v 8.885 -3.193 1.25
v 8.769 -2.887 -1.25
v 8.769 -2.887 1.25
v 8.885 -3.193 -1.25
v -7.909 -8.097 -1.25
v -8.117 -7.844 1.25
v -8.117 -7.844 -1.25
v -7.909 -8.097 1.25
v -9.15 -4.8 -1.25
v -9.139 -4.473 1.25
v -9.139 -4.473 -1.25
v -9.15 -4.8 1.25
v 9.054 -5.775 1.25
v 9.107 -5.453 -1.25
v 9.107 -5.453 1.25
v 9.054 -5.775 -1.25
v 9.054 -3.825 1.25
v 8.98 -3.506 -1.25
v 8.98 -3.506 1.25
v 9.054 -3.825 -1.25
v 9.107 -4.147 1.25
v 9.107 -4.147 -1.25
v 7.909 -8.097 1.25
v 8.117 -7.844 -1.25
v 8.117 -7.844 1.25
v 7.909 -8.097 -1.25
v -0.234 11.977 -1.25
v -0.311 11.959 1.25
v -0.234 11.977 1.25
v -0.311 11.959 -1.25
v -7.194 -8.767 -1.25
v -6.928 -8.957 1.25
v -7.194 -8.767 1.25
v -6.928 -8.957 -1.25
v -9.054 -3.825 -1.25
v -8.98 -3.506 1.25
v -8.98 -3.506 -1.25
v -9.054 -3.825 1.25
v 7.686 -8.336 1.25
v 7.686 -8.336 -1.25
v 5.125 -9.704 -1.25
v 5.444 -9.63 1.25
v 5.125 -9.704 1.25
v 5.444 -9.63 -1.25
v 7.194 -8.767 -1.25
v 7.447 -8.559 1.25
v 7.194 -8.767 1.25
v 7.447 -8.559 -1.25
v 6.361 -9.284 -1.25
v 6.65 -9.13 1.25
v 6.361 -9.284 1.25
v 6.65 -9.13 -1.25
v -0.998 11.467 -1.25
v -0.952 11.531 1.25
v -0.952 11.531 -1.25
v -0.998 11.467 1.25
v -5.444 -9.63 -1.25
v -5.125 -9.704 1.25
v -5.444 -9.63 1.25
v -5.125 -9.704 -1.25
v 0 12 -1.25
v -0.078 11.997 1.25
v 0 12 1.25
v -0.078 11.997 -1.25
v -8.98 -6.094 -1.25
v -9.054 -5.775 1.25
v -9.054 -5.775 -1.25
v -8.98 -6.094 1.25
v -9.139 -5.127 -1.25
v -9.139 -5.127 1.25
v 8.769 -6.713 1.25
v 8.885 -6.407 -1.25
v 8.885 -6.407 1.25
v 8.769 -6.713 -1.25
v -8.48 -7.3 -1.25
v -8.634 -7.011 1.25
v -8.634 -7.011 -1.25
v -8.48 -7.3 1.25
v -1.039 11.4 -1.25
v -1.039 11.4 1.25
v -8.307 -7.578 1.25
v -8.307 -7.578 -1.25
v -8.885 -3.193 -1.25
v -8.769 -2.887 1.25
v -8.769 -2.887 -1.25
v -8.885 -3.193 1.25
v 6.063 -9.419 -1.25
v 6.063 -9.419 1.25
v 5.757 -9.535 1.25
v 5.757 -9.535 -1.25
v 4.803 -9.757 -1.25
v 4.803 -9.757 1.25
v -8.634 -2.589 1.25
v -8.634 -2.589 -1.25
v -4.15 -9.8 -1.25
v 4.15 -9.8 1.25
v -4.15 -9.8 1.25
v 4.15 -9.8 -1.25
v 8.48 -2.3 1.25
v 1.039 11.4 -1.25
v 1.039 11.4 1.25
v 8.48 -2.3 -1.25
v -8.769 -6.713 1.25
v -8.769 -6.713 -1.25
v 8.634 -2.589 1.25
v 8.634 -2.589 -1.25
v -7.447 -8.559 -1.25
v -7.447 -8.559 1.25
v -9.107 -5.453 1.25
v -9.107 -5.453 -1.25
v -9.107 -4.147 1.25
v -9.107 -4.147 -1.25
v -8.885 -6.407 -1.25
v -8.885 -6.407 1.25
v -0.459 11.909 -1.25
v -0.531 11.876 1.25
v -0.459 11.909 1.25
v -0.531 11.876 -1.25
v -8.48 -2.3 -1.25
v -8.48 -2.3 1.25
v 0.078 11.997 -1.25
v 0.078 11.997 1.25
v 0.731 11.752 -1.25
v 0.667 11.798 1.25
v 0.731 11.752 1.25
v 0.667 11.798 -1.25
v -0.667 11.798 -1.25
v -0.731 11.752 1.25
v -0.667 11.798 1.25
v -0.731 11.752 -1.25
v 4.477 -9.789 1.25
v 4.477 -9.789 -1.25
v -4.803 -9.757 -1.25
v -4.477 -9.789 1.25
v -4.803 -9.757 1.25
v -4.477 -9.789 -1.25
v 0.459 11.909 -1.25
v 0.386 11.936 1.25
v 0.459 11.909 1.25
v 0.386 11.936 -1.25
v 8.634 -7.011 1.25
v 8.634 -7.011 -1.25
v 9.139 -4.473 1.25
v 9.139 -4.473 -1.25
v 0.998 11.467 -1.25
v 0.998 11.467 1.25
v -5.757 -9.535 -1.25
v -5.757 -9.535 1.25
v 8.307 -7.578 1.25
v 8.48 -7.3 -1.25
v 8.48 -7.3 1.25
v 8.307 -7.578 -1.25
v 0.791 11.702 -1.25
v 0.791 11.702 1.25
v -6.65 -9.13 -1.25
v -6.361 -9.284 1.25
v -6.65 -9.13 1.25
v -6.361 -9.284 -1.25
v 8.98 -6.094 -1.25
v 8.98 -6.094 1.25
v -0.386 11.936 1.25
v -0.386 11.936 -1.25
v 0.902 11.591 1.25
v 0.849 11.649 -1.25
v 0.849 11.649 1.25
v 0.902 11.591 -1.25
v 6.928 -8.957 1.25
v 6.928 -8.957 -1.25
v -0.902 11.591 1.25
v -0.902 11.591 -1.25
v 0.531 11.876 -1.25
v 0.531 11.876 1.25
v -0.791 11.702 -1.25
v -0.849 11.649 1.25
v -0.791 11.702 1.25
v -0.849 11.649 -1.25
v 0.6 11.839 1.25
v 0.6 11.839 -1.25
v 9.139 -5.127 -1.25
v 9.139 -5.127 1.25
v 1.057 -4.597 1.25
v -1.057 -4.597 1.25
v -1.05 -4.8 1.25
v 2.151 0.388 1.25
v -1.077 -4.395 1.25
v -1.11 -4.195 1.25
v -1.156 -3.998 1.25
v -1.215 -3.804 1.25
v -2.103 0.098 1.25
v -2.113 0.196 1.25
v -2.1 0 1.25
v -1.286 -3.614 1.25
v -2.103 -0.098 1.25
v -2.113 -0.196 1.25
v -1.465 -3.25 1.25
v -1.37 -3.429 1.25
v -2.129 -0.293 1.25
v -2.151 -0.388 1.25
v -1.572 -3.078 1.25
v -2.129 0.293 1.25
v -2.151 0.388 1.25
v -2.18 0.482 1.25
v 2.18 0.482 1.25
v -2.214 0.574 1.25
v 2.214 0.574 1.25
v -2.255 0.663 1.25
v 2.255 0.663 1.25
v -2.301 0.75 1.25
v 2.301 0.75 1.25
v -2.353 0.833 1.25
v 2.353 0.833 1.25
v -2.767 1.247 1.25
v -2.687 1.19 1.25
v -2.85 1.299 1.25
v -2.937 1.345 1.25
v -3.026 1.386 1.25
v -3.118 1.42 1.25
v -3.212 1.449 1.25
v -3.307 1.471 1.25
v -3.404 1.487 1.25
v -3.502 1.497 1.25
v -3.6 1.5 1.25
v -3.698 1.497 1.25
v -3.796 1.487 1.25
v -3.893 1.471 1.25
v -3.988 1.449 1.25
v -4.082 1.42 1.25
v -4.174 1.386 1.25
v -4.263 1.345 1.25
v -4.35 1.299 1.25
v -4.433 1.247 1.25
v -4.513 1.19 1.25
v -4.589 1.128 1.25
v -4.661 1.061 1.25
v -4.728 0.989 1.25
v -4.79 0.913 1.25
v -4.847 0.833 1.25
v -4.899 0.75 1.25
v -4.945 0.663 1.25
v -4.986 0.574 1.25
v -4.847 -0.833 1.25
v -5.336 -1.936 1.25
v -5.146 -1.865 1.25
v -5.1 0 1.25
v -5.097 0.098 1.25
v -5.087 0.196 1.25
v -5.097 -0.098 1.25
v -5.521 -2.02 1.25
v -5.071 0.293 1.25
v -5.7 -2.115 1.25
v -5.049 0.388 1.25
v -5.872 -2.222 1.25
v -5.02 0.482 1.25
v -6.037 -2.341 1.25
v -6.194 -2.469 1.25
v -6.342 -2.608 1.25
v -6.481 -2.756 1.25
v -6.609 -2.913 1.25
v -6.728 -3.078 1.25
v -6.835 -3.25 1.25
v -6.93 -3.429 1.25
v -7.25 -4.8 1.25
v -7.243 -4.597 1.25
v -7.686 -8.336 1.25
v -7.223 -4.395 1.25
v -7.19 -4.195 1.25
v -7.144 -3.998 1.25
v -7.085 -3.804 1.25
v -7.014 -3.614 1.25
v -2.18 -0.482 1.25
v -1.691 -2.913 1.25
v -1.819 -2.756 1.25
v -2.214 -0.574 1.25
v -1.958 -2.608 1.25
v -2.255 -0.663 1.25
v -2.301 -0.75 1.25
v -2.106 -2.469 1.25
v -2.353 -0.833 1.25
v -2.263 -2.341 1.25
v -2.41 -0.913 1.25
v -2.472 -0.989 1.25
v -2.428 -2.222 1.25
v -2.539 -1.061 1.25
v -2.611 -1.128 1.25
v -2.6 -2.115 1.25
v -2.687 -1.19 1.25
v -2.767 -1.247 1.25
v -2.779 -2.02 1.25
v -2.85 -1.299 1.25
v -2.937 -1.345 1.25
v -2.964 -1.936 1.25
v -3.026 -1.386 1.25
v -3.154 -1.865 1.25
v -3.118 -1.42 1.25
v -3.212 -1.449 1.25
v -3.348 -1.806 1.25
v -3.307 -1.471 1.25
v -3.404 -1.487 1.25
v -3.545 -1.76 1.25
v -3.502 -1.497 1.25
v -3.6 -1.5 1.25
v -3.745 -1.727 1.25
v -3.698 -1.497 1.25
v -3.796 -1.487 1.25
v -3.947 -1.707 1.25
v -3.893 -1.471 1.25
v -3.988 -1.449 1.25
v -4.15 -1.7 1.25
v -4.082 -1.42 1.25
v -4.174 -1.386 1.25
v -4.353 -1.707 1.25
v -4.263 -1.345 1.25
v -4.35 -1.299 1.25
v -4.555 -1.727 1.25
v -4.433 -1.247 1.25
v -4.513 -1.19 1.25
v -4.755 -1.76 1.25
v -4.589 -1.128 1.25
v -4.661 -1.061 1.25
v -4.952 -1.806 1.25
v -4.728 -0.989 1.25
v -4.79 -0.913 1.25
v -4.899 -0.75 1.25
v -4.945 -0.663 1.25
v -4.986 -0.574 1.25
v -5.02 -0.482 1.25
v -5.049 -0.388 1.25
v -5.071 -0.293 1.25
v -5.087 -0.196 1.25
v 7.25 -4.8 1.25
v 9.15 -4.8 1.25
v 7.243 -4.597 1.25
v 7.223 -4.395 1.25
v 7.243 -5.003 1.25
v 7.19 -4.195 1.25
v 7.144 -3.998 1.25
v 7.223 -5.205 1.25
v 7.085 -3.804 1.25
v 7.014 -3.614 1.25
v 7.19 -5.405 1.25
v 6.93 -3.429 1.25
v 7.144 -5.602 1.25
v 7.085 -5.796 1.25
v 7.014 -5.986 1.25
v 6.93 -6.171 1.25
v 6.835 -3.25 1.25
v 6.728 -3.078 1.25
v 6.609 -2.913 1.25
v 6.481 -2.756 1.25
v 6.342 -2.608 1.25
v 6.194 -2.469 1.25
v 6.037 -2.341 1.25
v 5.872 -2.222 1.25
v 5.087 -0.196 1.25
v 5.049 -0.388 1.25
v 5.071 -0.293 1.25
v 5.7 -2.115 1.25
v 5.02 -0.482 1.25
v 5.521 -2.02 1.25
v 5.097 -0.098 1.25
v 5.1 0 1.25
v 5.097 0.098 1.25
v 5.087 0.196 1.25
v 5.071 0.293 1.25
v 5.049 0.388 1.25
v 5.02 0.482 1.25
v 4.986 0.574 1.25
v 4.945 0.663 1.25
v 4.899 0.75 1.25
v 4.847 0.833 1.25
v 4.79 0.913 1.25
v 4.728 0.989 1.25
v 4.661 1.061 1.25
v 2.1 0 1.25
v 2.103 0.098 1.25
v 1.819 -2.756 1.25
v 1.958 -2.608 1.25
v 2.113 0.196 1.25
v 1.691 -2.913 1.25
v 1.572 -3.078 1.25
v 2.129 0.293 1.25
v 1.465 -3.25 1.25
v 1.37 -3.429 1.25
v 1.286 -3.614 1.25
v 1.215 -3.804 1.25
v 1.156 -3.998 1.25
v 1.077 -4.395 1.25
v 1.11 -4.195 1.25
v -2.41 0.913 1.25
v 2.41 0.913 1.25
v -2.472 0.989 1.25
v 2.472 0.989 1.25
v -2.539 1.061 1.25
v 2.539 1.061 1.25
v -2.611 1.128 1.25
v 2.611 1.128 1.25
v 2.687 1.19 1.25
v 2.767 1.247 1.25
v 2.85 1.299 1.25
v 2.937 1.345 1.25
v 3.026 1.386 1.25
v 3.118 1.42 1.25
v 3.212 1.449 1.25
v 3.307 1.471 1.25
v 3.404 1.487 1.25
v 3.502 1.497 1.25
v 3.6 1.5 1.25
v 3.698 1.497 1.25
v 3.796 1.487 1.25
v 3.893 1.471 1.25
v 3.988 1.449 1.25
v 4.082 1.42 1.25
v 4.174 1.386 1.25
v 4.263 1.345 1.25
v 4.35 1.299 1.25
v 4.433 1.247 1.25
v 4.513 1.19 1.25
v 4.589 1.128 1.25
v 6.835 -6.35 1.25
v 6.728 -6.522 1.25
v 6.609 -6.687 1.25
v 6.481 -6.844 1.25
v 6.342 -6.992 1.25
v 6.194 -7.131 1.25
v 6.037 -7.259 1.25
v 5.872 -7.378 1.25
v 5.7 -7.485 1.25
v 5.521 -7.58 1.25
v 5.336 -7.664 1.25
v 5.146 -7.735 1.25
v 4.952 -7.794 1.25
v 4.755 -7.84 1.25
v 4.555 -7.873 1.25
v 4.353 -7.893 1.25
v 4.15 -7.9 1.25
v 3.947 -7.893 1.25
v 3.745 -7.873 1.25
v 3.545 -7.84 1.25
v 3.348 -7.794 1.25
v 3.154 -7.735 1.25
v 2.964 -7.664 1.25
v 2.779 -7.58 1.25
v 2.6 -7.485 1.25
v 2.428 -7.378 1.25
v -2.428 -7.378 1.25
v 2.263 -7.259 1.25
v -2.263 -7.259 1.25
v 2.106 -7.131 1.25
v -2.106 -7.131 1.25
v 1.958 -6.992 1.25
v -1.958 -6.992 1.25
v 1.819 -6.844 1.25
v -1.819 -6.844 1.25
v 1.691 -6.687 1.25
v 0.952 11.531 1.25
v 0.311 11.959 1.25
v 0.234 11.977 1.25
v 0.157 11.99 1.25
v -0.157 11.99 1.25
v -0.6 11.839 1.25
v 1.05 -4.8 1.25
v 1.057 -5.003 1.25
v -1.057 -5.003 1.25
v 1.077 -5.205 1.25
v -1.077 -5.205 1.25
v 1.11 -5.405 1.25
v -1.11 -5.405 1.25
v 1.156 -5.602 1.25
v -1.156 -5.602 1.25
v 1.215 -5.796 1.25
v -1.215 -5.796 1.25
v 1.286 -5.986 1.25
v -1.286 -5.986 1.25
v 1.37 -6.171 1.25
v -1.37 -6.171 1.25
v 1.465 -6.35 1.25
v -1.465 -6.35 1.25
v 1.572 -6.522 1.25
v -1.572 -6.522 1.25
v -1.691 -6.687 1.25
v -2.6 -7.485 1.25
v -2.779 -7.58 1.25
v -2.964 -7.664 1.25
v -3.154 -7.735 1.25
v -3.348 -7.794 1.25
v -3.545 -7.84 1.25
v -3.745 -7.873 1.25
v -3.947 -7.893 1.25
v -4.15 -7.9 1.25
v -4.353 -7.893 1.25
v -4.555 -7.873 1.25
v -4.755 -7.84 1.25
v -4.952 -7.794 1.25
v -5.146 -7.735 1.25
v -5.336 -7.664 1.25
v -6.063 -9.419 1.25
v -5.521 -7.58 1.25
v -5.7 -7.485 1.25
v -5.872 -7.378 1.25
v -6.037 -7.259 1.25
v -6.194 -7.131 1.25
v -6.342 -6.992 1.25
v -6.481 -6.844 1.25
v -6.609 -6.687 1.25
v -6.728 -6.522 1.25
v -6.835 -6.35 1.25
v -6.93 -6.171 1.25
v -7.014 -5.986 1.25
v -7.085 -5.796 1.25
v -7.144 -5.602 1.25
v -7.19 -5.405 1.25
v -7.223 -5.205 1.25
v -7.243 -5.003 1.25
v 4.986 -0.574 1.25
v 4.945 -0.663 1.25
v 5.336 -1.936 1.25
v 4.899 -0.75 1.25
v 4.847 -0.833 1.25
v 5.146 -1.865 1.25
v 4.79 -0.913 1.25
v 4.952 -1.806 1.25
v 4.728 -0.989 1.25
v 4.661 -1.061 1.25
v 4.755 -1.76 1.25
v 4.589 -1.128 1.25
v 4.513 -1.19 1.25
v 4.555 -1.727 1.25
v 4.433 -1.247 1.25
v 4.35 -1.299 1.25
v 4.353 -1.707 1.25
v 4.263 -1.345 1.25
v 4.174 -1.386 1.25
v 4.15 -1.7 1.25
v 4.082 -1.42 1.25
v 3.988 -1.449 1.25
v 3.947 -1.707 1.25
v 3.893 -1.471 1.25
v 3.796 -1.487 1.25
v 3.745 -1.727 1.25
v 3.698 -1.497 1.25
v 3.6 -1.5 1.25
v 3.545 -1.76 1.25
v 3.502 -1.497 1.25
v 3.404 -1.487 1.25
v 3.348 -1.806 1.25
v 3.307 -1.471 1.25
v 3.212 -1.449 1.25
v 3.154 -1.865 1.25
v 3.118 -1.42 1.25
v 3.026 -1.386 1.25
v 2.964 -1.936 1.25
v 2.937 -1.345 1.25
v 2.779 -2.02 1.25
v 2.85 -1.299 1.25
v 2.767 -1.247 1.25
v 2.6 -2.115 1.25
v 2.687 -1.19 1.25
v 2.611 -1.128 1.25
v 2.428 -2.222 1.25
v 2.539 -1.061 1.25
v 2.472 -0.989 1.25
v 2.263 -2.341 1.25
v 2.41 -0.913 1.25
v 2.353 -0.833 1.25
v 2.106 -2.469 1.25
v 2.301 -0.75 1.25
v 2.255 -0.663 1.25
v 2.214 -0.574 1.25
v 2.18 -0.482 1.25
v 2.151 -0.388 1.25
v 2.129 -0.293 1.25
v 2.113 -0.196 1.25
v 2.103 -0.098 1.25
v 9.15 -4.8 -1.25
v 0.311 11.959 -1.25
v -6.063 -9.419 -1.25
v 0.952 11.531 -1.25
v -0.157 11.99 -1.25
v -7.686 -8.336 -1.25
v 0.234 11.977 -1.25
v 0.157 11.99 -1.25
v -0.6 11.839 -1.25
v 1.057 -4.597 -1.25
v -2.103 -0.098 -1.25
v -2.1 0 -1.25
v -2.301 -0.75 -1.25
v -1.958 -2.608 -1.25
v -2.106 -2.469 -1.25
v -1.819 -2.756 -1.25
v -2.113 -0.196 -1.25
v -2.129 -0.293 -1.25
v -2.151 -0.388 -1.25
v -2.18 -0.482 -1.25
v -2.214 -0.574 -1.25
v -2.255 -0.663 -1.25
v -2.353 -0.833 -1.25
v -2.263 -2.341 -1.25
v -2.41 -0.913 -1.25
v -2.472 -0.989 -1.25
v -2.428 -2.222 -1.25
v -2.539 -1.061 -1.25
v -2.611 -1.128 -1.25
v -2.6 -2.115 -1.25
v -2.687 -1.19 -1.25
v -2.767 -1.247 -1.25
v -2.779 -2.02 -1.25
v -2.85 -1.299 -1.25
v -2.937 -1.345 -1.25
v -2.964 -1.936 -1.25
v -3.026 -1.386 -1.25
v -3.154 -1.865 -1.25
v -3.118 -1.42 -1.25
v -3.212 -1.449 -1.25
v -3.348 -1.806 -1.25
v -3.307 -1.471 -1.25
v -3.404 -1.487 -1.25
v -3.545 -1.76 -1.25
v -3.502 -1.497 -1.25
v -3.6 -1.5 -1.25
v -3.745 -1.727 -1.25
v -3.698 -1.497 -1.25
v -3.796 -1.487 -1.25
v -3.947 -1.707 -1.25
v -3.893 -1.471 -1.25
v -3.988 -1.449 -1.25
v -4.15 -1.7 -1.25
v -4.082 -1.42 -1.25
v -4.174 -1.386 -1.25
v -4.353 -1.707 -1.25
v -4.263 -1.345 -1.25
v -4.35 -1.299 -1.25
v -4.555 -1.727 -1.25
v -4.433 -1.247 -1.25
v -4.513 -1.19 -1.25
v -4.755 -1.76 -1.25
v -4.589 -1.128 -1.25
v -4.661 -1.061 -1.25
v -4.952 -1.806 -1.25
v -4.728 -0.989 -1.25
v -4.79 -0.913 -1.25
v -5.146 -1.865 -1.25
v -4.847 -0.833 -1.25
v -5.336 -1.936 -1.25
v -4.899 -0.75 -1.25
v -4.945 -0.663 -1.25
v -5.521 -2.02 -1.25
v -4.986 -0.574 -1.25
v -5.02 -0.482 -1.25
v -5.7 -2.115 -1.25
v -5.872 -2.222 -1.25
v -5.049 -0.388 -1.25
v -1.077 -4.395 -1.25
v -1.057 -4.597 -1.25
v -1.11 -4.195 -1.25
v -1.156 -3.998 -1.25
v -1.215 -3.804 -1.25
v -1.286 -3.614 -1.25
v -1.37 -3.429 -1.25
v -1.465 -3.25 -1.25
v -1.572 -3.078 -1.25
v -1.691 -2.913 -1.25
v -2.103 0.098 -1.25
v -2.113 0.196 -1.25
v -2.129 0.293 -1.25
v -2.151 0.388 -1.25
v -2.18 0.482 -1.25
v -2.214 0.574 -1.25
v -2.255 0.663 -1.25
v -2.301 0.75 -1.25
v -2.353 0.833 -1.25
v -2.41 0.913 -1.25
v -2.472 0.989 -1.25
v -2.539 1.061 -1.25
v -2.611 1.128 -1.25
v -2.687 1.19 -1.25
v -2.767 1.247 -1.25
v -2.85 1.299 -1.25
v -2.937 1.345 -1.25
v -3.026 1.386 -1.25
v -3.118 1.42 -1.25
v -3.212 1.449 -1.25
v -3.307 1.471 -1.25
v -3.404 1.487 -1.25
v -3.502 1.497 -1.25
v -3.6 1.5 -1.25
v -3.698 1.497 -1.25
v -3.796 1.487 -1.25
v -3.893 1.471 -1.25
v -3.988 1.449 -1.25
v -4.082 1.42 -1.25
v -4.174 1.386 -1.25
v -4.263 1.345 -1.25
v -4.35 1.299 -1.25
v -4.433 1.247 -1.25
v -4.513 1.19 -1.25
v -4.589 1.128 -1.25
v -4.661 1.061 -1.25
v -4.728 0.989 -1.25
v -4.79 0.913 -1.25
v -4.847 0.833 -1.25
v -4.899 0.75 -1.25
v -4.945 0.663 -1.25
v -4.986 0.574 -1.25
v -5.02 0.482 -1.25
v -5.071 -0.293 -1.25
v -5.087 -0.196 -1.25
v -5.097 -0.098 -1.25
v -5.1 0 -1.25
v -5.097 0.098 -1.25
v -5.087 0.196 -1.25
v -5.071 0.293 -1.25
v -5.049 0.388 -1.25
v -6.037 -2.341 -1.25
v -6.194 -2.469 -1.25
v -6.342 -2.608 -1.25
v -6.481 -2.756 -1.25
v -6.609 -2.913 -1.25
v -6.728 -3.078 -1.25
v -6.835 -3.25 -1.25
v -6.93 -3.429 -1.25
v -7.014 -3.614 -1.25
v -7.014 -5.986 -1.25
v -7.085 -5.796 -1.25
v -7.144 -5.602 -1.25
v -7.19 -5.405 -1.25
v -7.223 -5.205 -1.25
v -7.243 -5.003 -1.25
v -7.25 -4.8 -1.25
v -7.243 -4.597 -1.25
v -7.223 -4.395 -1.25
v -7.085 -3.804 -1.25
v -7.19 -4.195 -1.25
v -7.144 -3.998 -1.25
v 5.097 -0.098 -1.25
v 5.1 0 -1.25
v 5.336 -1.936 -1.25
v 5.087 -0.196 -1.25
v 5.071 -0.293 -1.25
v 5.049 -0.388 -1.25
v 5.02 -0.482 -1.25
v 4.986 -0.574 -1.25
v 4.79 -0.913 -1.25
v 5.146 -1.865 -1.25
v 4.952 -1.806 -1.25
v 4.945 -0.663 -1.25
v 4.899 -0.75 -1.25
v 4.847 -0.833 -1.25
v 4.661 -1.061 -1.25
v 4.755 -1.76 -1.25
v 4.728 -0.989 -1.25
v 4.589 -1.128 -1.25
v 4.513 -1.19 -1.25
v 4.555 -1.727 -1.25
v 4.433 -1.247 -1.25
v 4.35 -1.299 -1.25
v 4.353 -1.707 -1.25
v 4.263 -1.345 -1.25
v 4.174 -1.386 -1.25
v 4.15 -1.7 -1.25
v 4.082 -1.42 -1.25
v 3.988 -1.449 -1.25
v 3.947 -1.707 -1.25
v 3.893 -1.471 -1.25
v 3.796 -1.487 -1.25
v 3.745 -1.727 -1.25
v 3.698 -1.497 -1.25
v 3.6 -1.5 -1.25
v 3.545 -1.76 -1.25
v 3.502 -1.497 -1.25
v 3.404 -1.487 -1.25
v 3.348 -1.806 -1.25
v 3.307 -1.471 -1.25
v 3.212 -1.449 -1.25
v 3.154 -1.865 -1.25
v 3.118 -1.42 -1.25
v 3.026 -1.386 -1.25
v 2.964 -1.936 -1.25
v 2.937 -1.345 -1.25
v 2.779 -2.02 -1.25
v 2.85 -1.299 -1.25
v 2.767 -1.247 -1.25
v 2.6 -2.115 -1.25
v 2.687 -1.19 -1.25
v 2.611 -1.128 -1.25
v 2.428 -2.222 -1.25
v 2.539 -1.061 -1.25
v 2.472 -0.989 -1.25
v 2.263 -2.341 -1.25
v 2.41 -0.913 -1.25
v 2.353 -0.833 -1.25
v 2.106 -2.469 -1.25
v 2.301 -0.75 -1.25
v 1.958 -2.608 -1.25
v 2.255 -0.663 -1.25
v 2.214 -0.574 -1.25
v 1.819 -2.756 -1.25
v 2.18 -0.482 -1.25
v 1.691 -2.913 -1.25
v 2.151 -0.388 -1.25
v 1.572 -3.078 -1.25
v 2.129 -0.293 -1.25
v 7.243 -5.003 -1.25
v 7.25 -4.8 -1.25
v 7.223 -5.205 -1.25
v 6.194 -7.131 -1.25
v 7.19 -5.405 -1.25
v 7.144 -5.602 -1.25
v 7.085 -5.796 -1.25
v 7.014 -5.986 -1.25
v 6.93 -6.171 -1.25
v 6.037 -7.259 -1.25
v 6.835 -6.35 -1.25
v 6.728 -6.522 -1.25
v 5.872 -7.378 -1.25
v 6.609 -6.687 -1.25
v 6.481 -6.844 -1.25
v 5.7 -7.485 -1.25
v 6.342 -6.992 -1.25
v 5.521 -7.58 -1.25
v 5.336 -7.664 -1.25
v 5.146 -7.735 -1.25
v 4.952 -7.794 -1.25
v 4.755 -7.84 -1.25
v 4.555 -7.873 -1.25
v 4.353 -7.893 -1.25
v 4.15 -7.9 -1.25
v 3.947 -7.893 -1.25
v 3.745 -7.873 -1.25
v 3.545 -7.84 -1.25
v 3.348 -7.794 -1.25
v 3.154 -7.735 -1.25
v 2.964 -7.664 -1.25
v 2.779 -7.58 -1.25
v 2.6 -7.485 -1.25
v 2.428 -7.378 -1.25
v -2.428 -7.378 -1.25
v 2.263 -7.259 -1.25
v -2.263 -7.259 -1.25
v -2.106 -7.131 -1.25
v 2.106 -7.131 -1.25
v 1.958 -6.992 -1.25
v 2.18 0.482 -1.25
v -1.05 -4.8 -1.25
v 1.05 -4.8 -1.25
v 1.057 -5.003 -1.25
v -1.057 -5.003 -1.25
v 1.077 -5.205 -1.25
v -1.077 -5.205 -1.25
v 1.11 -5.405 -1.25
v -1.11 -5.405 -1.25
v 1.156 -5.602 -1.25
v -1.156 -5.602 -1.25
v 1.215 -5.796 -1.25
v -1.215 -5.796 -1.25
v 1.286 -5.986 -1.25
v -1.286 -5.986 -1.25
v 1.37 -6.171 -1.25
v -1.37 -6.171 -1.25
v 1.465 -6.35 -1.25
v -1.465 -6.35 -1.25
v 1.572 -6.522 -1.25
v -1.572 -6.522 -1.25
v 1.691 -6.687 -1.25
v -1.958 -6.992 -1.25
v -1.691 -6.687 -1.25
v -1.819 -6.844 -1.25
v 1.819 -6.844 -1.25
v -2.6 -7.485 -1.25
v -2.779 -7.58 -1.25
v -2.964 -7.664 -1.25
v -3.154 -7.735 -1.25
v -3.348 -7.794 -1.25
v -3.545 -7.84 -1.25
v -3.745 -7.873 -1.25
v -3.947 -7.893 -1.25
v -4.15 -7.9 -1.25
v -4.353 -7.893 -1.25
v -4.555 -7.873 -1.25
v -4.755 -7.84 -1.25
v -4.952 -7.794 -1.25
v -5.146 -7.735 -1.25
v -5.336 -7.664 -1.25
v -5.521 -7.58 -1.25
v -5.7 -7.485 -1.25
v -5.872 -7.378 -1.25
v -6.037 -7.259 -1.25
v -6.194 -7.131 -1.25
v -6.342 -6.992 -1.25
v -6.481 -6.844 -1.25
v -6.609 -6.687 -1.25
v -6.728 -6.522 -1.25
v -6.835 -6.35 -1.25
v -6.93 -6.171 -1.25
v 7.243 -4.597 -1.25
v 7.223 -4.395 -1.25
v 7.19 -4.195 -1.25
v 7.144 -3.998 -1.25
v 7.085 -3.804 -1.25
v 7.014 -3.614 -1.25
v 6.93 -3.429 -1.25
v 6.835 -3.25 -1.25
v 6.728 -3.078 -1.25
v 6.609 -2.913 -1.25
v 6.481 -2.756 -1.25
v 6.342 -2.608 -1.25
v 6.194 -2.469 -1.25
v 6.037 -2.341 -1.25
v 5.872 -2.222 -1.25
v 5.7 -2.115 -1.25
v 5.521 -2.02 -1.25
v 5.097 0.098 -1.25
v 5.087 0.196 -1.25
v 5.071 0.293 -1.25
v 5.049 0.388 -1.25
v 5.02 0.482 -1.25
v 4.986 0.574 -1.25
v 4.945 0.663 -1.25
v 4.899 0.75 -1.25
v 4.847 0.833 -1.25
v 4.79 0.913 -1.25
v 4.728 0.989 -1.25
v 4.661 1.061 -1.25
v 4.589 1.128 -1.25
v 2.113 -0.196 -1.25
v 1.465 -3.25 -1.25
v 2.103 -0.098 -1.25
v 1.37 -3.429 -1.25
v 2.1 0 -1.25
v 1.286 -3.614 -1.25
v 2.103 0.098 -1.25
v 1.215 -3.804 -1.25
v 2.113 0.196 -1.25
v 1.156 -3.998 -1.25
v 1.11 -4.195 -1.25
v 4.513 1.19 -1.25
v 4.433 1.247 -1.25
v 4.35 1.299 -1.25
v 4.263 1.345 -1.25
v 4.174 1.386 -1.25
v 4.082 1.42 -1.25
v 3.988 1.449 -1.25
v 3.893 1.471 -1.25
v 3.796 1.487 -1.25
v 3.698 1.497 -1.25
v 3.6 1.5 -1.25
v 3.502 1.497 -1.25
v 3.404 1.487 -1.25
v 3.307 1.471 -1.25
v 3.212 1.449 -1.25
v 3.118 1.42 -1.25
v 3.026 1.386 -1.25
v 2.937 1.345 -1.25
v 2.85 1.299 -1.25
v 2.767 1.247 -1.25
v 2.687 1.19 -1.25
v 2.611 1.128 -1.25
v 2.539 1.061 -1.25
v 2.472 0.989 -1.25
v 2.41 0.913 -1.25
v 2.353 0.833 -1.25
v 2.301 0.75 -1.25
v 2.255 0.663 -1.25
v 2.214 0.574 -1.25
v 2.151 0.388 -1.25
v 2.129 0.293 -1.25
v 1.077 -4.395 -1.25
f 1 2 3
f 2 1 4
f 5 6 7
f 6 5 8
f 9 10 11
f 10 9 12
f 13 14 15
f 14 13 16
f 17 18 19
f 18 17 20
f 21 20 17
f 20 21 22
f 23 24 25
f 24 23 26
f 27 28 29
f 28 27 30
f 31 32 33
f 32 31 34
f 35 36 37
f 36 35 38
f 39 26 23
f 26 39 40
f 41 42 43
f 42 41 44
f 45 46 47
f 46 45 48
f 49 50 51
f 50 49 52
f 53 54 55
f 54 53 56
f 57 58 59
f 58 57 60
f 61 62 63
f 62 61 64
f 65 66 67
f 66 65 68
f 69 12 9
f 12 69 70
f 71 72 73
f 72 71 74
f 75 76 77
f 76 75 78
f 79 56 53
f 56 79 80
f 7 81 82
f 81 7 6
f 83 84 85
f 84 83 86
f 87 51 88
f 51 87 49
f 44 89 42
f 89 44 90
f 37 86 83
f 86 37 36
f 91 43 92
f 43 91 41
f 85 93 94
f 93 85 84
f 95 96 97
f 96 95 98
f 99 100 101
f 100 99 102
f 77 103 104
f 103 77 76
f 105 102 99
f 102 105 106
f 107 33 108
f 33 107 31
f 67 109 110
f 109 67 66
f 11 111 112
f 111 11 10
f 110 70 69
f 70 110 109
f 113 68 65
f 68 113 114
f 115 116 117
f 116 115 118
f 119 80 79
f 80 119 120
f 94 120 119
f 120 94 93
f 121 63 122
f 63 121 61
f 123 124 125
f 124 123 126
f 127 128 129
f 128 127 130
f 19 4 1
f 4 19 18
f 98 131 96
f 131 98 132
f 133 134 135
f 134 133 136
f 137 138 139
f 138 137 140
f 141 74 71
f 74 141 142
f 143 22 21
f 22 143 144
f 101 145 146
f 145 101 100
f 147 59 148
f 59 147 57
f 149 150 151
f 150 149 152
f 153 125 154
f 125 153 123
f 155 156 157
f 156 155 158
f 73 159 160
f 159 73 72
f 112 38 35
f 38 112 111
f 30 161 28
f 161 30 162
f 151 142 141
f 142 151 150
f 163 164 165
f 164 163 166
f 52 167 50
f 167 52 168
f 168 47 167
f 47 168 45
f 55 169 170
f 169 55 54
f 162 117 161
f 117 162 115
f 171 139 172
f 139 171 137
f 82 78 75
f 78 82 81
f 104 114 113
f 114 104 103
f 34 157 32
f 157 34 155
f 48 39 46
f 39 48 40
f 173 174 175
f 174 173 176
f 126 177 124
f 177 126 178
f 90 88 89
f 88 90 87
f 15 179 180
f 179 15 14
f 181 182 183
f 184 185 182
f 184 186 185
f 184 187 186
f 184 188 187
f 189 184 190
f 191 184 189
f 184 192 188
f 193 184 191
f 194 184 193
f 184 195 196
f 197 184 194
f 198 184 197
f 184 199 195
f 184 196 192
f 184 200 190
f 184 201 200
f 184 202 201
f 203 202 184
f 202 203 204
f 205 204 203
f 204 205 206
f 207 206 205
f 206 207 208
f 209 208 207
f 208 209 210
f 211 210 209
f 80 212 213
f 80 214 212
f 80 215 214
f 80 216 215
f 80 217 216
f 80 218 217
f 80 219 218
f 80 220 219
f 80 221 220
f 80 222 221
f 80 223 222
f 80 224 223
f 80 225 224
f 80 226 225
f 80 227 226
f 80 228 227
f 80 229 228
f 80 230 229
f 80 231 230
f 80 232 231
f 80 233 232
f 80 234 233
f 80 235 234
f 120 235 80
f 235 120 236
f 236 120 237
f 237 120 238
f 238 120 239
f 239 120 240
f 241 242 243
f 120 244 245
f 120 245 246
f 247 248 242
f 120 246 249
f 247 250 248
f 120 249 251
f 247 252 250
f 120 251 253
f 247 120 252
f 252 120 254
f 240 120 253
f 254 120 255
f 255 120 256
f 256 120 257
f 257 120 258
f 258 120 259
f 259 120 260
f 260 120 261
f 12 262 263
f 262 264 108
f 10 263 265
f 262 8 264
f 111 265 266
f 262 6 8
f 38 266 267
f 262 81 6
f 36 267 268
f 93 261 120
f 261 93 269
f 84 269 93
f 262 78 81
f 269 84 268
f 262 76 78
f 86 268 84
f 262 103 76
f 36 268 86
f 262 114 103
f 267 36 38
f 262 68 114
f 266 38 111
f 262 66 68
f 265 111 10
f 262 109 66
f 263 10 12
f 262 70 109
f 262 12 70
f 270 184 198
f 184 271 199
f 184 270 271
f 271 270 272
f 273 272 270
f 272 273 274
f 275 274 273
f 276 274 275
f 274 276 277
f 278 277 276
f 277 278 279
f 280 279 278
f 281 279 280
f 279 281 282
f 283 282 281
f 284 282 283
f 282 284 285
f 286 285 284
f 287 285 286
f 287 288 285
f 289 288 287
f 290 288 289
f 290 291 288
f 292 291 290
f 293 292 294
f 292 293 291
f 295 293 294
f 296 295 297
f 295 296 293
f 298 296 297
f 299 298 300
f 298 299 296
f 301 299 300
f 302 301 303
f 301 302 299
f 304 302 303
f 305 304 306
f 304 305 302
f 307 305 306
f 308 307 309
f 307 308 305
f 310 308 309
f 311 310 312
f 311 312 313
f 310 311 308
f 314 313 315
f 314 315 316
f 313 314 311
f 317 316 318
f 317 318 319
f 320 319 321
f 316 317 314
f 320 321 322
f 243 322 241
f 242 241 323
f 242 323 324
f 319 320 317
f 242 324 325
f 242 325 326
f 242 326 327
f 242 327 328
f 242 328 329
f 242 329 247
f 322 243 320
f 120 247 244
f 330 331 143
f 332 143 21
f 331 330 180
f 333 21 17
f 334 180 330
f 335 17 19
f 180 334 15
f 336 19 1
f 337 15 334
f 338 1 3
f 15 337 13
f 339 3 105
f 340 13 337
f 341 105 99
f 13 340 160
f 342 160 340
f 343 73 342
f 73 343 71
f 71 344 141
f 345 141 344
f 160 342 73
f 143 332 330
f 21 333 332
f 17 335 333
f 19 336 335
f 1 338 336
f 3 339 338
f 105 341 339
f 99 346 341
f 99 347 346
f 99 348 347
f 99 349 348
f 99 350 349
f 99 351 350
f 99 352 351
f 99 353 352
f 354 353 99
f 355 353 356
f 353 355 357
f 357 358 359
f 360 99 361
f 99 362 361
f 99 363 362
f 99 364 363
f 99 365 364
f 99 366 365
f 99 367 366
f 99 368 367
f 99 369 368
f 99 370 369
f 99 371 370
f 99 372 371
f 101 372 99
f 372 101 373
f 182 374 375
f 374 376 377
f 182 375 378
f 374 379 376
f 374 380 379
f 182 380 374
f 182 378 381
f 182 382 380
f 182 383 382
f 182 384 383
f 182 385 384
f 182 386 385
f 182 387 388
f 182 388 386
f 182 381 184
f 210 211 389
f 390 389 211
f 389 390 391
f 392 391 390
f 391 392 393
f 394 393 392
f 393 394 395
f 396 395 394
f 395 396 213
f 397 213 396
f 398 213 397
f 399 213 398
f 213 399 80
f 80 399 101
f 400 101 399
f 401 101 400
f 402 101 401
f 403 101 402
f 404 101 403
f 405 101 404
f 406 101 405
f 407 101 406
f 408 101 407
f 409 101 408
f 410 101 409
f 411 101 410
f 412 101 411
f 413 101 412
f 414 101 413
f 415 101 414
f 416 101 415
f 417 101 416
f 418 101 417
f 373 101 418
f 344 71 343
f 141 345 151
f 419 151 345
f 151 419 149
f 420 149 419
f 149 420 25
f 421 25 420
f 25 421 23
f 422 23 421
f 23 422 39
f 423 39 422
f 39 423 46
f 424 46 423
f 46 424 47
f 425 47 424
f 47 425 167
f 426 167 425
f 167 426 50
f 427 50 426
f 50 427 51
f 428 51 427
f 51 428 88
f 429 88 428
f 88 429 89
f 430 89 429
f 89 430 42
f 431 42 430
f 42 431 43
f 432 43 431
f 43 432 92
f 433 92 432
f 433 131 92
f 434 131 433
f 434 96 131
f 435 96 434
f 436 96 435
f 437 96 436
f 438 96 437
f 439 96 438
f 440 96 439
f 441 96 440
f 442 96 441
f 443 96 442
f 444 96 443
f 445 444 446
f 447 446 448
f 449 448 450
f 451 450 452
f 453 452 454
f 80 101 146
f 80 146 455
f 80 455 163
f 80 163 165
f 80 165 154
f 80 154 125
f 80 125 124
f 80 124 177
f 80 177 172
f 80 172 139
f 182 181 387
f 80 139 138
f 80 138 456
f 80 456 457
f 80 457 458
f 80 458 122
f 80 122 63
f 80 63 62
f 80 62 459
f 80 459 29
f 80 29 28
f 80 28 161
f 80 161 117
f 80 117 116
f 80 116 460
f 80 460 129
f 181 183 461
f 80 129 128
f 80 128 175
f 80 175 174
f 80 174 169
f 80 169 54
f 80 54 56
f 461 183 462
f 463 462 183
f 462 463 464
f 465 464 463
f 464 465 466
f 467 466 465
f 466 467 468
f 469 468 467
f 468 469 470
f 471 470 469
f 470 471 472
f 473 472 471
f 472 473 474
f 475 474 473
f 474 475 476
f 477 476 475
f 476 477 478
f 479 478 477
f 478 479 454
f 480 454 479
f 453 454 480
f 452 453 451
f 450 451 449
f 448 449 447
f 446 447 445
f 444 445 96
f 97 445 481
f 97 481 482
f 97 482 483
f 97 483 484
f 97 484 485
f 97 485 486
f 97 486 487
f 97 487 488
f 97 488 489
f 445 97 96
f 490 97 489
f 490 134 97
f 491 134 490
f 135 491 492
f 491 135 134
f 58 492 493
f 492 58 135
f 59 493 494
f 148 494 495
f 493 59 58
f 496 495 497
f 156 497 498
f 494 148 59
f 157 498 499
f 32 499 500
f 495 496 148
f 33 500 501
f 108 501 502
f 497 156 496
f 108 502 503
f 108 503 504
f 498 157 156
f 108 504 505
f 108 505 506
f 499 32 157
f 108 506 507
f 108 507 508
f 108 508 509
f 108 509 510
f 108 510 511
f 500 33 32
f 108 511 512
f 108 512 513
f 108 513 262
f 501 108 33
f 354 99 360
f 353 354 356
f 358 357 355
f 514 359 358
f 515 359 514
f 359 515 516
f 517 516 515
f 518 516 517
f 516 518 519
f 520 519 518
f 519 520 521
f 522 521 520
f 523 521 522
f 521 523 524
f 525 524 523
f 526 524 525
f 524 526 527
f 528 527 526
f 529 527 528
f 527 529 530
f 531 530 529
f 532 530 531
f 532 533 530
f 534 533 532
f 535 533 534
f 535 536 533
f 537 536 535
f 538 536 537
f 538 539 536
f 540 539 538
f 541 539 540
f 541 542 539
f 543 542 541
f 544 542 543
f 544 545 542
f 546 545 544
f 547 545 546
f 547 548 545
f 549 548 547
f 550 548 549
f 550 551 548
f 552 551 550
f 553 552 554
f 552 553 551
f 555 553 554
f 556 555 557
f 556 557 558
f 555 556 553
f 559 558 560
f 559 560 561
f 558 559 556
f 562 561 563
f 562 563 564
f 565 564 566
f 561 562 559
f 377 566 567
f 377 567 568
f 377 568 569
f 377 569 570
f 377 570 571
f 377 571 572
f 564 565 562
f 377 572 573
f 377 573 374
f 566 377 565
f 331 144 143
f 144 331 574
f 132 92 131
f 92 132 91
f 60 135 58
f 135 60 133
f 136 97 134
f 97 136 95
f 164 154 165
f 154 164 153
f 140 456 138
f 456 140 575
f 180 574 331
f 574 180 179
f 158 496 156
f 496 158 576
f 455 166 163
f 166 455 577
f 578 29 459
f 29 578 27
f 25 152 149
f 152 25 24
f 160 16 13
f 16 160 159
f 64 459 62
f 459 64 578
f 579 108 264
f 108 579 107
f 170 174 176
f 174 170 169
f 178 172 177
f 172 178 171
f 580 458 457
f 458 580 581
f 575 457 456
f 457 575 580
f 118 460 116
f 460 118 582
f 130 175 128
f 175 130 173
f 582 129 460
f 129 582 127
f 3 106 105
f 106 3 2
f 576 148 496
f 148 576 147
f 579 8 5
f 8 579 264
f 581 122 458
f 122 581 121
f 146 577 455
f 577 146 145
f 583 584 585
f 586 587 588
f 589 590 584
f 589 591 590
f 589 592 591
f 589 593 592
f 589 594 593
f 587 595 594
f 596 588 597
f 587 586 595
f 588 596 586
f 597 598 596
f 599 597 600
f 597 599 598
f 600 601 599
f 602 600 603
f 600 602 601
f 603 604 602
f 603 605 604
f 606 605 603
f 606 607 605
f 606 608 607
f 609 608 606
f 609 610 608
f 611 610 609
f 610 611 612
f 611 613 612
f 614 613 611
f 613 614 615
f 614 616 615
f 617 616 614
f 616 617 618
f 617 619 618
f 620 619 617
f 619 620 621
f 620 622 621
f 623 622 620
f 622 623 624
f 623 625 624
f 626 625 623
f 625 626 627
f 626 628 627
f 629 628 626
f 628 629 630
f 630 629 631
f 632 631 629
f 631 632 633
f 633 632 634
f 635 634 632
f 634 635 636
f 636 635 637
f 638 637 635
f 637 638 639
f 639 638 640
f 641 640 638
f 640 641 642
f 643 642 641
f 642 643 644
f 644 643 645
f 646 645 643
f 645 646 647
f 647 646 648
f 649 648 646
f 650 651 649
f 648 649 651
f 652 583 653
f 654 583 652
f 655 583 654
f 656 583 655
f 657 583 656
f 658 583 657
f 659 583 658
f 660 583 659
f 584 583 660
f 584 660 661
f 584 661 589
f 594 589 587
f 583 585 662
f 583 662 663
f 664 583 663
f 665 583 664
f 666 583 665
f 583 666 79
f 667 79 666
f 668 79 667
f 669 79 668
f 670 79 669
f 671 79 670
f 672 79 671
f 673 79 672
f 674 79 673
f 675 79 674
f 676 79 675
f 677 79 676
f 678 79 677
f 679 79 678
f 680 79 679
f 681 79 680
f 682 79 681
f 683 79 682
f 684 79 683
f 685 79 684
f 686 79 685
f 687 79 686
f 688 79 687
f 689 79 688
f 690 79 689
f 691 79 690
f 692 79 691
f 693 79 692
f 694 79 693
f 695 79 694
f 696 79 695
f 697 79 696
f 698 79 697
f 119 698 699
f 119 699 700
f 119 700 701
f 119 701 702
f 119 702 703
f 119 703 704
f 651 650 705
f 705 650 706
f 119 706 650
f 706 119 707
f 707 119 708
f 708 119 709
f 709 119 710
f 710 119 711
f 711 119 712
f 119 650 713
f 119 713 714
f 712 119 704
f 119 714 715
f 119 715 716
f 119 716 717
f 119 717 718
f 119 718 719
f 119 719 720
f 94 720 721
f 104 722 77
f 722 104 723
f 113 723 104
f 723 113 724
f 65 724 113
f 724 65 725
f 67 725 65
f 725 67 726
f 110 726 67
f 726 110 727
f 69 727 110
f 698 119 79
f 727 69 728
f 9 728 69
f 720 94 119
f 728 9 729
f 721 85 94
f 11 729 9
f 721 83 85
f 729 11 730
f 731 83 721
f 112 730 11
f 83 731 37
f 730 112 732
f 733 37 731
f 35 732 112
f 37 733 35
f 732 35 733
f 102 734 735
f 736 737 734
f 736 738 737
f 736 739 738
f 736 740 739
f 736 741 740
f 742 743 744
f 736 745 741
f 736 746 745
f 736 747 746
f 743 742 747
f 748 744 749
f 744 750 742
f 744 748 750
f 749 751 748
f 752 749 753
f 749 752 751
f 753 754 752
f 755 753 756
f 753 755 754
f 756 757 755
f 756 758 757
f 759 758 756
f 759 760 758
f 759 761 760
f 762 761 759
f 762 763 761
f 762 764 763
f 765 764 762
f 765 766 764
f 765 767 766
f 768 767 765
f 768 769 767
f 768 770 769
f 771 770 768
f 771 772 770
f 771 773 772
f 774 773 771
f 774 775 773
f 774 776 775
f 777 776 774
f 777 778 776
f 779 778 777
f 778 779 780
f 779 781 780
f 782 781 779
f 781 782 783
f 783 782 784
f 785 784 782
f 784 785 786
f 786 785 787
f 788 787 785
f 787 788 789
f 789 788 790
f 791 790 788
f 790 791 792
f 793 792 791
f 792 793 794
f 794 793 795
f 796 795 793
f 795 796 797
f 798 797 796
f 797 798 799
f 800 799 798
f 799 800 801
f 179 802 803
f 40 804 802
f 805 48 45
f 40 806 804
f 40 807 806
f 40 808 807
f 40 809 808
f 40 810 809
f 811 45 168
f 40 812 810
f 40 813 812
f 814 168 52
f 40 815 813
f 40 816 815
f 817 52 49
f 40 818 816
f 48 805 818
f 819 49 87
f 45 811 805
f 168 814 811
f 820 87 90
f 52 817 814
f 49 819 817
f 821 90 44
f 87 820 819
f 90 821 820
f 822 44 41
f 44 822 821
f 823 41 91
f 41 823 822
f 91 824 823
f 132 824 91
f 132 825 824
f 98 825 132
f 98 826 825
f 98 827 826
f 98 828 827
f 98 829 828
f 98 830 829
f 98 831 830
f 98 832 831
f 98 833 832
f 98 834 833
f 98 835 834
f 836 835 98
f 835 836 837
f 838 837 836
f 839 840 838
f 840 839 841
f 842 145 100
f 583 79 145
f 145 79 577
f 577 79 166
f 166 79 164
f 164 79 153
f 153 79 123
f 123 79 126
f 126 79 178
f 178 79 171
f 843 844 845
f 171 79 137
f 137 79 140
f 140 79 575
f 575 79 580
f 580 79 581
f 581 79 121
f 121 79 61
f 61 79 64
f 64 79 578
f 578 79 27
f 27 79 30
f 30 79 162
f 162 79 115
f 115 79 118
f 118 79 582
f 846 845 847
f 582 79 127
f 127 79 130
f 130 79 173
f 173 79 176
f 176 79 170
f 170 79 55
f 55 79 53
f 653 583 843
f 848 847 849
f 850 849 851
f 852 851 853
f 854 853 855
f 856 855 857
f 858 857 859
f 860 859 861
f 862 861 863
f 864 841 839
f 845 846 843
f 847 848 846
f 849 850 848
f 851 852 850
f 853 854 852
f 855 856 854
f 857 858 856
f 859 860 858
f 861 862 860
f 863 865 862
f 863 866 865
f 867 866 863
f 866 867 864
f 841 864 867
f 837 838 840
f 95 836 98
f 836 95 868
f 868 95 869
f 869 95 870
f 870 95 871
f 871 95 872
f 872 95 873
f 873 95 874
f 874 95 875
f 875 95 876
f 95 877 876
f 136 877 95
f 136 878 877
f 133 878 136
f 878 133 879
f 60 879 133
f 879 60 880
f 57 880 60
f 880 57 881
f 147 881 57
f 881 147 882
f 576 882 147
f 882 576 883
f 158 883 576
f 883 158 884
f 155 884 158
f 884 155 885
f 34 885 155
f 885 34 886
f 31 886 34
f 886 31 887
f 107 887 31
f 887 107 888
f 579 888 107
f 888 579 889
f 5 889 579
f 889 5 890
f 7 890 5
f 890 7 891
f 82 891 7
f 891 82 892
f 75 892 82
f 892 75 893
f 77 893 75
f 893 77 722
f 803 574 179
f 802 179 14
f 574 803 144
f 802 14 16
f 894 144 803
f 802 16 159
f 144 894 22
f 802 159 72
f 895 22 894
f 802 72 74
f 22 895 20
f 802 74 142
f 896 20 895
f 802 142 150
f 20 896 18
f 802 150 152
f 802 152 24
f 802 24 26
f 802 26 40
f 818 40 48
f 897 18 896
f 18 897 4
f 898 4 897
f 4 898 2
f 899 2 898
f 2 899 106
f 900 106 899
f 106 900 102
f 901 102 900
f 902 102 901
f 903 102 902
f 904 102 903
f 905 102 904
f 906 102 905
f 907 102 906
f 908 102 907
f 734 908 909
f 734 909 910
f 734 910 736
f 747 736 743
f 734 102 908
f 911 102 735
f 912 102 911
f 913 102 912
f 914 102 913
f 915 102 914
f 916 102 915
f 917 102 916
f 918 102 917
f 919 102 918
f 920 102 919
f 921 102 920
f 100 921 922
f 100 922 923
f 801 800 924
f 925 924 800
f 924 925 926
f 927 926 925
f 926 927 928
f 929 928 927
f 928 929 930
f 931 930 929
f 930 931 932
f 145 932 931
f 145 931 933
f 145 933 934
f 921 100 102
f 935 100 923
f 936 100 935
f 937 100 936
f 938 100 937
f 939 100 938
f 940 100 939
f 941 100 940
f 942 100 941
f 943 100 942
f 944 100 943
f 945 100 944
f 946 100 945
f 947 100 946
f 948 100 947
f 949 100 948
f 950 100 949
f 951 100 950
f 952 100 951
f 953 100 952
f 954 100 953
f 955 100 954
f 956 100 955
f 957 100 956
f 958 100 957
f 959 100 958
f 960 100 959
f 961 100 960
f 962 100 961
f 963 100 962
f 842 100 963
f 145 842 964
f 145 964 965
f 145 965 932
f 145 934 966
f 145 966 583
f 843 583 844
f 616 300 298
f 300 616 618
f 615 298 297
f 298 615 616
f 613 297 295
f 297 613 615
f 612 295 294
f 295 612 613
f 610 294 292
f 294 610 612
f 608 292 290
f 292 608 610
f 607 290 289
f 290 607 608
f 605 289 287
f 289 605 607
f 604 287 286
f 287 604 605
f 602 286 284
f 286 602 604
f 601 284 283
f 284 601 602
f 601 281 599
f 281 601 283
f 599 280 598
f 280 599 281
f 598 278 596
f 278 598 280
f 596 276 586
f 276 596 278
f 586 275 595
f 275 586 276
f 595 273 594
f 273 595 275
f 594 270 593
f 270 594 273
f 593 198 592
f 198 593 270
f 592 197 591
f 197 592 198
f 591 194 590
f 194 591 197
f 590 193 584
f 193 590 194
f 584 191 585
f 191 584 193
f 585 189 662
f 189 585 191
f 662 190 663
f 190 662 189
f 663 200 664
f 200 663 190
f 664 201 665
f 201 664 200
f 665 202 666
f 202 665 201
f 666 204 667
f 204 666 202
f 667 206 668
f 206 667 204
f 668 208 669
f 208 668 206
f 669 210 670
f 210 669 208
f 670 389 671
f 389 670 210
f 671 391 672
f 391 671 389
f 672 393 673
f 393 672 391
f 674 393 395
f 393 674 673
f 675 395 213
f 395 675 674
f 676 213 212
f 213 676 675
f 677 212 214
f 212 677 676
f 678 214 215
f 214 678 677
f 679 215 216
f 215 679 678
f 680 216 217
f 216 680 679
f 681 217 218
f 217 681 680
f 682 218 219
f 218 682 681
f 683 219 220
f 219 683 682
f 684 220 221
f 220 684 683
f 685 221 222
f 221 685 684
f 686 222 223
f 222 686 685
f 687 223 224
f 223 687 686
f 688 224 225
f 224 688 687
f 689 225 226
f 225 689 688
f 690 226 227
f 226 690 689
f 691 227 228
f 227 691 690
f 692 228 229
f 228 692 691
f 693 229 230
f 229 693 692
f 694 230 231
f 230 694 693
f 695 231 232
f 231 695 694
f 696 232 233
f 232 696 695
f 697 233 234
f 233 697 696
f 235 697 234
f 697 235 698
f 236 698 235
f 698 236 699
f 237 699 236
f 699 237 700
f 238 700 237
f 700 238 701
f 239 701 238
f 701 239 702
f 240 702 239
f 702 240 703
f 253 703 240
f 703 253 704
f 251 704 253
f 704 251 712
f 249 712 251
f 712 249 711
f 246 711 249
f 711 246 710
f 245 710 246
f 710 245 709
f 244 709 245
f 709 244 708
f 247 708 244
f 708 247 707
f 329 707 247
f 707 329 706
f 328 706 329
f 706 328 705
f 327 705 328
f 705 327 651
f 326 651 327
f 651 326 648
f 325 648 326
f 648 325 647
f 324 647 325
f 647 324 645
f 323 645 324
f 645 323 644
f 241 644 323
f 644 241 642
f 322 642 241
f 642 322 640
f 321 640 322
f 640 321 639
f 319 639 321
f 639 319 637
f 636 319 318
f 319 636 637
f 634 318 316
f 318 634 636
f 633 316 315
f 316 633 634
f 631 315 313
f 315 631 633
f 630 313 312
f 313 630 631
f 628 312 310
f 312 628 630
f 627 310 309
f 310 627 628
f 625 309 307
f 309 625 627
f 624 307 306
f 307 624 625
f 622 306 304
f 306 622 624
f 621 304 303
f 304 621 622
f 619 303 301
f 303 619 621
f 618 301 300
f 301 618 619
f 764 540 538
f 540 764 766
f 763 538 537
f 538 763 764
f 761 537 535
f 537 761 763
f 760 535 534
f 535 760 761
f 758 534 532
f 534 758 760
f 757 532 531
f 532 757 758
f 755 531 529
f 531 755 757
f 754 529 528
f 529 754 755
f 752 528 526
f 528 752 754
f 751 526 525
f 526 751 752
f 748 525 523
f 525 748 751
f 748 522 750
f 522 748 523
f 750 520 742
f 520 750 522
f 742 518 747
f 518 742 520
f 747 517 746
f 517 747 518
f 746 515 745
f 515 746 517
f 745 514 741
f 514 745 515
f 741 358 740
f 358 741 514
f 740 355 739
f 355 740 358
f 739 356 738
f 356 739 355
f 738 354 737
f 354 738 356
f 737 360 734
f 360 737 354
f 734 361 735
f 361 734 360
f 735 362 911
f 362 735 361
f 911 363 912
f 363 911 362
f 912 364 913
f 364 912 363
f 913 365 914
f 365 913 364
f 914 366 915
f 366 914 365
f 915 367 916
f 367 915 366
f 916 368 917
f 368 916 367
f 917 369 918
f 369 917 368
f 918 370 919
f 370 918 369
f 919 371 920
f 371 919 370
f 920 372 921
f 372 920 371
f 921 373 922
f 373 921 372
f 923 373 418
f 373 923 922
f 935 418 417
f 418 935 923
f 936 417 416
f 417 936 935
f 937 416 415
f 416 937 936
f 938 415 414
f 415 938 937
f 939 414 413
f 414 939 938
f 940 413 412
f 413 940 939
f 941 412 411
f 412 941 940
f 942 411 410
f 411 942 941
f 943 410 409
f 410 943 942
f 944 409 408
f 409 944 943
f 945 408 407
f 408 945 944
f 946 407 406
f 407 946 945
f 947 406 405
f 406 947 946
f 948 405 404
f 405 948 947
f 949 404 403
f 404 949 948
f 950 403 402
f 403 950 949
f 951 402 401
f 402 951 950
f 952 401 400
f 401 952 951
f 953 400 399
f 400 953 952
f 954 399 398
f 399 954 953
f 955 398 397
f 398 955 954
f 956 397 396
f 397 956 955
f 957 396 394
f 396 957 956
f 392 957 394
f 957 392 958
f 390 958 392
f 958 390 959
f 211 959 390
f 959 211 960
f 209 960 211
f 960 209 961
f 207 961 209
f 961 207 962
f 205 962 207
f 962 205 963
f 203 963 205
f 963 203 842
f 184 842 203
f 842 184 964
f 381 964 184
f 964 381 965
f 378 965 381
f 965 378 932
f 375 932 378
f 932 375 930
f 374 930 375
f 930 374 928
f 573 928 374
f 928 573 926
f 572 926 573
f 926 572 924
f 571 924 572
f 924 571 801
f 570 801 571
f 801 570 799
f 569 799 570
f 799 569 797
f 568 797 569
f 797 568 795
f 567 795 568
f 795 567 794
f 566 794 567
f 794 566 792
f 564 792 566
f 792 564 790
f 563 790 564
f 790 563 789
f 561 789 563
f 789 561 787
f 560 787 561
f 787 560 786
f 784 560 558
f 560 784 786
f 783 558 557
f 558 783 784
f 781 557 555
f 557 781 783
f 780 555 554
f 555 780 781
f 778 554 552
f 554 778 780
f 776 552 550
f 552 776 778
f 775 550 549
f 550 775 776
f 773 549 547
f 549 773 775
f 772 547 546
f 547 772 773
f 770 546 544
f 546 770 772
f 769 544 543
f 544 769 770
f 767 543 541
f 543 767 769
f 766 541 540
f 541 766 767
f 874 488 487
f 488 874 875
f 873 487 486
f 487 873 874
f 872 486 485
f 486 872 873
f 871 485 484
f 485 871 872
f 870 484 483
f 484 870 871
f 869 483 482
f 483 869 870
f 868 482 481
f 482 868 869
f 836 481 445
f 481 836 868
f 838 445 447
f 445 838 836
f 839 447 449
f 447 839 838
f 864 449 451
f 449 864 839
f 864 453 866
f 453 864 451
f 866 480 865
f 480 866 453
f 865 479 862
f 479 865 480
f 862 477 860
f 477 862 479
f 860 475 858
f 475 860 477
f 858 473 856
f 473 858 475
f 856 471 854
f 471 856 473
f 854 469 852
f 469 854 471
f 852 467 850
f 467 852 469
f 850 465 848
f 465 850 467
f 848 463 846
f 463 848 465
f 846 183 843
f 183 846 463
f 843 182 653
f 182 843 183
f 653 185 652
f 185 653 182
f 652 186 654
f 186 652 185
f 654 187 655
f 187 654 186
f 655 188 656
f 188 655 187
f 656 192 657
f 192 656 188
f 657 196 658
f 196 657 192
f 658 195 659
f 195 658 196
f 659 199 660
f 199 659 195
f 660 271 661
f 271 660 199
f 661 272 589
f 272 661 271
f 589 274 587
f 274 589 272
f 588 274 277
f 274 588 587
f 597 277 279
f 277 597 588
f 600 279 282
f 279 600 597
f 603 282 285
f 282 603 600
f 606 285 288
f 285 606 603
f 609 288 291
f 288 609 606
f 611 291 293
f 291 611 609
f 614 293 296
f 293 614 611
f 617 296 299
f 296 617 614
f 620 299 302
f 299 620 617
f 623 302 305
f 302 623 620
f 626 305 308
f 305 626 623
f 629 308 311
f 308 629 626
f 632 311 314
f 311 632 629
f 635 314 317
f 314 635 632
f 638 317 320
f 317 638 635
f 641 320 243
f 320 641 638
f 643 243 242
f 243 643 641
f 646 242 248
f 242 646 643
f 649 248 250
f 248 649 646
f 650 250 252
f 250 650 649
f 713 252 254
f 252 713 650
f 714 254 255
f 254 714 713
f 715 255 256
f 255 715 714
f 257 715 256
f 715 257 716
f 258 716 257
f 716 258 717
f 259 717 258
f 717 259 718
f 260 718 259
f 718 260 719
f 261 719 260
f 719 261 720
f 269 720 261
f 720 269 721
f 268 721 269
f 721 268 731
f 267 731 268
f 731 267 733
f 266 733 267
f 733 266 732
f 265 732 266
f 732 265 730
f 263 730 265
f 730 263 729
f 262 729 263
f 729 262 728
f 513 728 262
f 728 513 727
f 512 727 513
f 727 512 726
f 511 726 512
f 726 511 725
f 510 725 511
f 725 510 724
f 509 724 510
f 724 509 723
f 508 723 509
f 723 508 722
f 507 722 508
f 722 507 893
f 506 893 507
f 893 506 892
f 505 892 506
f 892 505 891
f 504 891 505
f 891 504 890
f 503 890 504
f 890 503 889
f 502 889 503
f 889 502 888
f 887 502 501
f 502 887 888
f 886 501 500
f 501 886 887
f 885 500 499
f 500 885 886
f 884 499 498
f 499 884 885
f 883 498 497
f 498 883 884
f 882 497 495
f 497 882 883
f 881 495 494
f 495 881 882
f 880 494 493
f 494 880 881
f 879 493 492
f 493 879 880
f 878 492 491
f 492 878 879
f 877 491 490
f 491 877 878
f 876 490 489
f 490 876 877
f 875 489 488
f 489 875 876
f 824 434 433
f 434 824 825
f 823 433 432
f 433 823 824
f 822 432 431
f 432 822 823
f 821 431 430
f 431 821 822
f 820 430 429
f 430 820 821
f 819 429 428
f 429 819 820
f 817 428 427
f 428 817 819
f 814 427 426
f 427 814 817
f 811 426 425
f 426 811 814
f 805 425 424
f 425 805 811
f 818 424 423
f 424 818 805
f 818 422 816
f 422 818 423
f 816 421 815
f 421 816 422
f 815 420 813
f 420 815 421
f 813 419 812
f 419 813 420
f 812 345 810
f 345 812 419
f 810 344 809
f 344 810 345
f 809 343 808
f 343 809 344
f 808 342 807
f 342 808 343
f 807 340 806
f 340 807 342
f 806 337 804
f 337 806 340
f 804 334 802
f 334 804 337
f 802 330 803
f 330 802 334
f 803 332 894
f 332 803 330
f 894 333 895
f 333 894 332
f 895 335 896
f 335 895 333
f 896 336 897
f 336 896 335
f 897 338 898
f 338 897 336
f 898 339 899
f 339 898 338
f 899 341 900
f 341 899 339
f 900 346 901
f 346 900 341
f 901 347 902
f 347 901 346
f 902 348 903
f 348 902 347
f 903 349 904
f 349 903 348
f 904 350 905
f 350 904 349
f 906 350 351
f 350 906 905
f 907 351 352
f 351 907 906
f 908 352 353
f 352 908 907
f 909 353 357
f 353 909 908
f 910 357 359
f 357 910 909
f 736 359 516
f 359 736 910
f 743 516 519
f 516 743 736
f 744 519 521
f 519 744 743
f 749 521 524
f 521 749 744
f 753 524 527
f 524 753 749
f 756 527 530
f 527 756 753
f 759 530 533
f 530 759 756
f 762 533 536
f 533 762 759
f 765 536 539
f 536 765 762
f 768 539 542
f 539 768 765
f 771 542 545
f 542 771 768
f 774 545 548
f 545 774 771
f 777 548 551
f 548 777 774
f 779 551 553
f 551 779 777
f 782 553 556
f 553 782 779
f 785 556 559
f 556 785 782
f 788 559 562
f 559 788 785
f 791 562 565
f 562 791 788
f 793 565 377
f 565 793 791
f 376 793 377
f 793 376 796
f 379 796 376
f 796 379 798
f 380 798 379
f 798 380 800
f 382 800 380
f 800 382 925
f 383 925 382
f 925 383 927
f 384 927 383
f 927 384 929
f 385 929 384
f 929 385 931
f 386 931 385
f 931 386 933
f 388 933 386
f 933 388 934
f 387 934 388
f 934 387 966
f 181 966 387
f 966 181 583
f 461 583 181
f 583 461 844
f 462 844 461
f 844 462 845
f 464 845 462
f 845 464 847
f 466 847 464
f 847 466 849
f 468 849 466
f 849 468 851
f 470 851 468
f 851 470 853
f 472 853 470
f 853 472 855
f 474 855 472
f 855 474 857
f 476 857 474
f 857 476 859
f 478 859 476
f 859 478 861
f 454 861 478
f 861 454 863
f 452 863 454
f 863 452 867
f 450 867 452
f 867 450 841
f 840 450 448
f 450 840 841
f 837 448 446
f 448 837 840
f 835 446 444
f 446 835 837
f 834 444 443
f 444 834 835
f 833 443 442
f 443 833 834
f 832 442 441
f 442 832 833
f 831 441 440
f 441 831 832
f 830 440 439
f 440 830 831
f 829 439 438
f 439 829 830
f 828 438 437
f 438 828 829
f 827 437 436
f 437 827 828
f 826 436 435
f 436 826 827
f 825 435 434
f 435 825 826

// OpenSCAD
$fn=96;

th = 2.5;

bbox_x = 18.3;
bbox_y = 21.6;

lobe_r = 5.0;
lobe_offset_x = 4.15;
lobe_y = 6.0;

tip_y = bbox_y/2;

big_hole_d = 6.2;
small_hole_d = 3.0;

small_hole_y = 0.0;
small_hole_x = 3.6;

module plate_outline_2d() {
    hull() {
        translate([-lobe_offset_x, -bbox_y/2 + lobe_y]) circle(r=lobe_r);
        translate([ lobe_offset_x, -bbox_y/2 + lobe_y]) circle(r=lobe_r);
        translate([0, tip_y]) circle(r=1.2);
    }
}

module holes_2d() {
    translate([-lobe_offset_x, -bbox_y/2 + lobe_y]) circle(d=big_hole_d);
    translate([ lobe_offset_x, -bbox_y/2 + lobe_y]) circle(d=big_hole_d);

    translate([-small_hole_x, small_hole_y]) circle(d=small_hole_d);
    translate([ small_hole_x, small_hole_y]) circle(d=small_hole_d);
}

difference() {
    linear_extrude(height=th, center=true)
        plate_outline_2d();

    translate([0,0,0])
        linear_extrude(height=th+0.6, center=true)
            holes_2d();
}
